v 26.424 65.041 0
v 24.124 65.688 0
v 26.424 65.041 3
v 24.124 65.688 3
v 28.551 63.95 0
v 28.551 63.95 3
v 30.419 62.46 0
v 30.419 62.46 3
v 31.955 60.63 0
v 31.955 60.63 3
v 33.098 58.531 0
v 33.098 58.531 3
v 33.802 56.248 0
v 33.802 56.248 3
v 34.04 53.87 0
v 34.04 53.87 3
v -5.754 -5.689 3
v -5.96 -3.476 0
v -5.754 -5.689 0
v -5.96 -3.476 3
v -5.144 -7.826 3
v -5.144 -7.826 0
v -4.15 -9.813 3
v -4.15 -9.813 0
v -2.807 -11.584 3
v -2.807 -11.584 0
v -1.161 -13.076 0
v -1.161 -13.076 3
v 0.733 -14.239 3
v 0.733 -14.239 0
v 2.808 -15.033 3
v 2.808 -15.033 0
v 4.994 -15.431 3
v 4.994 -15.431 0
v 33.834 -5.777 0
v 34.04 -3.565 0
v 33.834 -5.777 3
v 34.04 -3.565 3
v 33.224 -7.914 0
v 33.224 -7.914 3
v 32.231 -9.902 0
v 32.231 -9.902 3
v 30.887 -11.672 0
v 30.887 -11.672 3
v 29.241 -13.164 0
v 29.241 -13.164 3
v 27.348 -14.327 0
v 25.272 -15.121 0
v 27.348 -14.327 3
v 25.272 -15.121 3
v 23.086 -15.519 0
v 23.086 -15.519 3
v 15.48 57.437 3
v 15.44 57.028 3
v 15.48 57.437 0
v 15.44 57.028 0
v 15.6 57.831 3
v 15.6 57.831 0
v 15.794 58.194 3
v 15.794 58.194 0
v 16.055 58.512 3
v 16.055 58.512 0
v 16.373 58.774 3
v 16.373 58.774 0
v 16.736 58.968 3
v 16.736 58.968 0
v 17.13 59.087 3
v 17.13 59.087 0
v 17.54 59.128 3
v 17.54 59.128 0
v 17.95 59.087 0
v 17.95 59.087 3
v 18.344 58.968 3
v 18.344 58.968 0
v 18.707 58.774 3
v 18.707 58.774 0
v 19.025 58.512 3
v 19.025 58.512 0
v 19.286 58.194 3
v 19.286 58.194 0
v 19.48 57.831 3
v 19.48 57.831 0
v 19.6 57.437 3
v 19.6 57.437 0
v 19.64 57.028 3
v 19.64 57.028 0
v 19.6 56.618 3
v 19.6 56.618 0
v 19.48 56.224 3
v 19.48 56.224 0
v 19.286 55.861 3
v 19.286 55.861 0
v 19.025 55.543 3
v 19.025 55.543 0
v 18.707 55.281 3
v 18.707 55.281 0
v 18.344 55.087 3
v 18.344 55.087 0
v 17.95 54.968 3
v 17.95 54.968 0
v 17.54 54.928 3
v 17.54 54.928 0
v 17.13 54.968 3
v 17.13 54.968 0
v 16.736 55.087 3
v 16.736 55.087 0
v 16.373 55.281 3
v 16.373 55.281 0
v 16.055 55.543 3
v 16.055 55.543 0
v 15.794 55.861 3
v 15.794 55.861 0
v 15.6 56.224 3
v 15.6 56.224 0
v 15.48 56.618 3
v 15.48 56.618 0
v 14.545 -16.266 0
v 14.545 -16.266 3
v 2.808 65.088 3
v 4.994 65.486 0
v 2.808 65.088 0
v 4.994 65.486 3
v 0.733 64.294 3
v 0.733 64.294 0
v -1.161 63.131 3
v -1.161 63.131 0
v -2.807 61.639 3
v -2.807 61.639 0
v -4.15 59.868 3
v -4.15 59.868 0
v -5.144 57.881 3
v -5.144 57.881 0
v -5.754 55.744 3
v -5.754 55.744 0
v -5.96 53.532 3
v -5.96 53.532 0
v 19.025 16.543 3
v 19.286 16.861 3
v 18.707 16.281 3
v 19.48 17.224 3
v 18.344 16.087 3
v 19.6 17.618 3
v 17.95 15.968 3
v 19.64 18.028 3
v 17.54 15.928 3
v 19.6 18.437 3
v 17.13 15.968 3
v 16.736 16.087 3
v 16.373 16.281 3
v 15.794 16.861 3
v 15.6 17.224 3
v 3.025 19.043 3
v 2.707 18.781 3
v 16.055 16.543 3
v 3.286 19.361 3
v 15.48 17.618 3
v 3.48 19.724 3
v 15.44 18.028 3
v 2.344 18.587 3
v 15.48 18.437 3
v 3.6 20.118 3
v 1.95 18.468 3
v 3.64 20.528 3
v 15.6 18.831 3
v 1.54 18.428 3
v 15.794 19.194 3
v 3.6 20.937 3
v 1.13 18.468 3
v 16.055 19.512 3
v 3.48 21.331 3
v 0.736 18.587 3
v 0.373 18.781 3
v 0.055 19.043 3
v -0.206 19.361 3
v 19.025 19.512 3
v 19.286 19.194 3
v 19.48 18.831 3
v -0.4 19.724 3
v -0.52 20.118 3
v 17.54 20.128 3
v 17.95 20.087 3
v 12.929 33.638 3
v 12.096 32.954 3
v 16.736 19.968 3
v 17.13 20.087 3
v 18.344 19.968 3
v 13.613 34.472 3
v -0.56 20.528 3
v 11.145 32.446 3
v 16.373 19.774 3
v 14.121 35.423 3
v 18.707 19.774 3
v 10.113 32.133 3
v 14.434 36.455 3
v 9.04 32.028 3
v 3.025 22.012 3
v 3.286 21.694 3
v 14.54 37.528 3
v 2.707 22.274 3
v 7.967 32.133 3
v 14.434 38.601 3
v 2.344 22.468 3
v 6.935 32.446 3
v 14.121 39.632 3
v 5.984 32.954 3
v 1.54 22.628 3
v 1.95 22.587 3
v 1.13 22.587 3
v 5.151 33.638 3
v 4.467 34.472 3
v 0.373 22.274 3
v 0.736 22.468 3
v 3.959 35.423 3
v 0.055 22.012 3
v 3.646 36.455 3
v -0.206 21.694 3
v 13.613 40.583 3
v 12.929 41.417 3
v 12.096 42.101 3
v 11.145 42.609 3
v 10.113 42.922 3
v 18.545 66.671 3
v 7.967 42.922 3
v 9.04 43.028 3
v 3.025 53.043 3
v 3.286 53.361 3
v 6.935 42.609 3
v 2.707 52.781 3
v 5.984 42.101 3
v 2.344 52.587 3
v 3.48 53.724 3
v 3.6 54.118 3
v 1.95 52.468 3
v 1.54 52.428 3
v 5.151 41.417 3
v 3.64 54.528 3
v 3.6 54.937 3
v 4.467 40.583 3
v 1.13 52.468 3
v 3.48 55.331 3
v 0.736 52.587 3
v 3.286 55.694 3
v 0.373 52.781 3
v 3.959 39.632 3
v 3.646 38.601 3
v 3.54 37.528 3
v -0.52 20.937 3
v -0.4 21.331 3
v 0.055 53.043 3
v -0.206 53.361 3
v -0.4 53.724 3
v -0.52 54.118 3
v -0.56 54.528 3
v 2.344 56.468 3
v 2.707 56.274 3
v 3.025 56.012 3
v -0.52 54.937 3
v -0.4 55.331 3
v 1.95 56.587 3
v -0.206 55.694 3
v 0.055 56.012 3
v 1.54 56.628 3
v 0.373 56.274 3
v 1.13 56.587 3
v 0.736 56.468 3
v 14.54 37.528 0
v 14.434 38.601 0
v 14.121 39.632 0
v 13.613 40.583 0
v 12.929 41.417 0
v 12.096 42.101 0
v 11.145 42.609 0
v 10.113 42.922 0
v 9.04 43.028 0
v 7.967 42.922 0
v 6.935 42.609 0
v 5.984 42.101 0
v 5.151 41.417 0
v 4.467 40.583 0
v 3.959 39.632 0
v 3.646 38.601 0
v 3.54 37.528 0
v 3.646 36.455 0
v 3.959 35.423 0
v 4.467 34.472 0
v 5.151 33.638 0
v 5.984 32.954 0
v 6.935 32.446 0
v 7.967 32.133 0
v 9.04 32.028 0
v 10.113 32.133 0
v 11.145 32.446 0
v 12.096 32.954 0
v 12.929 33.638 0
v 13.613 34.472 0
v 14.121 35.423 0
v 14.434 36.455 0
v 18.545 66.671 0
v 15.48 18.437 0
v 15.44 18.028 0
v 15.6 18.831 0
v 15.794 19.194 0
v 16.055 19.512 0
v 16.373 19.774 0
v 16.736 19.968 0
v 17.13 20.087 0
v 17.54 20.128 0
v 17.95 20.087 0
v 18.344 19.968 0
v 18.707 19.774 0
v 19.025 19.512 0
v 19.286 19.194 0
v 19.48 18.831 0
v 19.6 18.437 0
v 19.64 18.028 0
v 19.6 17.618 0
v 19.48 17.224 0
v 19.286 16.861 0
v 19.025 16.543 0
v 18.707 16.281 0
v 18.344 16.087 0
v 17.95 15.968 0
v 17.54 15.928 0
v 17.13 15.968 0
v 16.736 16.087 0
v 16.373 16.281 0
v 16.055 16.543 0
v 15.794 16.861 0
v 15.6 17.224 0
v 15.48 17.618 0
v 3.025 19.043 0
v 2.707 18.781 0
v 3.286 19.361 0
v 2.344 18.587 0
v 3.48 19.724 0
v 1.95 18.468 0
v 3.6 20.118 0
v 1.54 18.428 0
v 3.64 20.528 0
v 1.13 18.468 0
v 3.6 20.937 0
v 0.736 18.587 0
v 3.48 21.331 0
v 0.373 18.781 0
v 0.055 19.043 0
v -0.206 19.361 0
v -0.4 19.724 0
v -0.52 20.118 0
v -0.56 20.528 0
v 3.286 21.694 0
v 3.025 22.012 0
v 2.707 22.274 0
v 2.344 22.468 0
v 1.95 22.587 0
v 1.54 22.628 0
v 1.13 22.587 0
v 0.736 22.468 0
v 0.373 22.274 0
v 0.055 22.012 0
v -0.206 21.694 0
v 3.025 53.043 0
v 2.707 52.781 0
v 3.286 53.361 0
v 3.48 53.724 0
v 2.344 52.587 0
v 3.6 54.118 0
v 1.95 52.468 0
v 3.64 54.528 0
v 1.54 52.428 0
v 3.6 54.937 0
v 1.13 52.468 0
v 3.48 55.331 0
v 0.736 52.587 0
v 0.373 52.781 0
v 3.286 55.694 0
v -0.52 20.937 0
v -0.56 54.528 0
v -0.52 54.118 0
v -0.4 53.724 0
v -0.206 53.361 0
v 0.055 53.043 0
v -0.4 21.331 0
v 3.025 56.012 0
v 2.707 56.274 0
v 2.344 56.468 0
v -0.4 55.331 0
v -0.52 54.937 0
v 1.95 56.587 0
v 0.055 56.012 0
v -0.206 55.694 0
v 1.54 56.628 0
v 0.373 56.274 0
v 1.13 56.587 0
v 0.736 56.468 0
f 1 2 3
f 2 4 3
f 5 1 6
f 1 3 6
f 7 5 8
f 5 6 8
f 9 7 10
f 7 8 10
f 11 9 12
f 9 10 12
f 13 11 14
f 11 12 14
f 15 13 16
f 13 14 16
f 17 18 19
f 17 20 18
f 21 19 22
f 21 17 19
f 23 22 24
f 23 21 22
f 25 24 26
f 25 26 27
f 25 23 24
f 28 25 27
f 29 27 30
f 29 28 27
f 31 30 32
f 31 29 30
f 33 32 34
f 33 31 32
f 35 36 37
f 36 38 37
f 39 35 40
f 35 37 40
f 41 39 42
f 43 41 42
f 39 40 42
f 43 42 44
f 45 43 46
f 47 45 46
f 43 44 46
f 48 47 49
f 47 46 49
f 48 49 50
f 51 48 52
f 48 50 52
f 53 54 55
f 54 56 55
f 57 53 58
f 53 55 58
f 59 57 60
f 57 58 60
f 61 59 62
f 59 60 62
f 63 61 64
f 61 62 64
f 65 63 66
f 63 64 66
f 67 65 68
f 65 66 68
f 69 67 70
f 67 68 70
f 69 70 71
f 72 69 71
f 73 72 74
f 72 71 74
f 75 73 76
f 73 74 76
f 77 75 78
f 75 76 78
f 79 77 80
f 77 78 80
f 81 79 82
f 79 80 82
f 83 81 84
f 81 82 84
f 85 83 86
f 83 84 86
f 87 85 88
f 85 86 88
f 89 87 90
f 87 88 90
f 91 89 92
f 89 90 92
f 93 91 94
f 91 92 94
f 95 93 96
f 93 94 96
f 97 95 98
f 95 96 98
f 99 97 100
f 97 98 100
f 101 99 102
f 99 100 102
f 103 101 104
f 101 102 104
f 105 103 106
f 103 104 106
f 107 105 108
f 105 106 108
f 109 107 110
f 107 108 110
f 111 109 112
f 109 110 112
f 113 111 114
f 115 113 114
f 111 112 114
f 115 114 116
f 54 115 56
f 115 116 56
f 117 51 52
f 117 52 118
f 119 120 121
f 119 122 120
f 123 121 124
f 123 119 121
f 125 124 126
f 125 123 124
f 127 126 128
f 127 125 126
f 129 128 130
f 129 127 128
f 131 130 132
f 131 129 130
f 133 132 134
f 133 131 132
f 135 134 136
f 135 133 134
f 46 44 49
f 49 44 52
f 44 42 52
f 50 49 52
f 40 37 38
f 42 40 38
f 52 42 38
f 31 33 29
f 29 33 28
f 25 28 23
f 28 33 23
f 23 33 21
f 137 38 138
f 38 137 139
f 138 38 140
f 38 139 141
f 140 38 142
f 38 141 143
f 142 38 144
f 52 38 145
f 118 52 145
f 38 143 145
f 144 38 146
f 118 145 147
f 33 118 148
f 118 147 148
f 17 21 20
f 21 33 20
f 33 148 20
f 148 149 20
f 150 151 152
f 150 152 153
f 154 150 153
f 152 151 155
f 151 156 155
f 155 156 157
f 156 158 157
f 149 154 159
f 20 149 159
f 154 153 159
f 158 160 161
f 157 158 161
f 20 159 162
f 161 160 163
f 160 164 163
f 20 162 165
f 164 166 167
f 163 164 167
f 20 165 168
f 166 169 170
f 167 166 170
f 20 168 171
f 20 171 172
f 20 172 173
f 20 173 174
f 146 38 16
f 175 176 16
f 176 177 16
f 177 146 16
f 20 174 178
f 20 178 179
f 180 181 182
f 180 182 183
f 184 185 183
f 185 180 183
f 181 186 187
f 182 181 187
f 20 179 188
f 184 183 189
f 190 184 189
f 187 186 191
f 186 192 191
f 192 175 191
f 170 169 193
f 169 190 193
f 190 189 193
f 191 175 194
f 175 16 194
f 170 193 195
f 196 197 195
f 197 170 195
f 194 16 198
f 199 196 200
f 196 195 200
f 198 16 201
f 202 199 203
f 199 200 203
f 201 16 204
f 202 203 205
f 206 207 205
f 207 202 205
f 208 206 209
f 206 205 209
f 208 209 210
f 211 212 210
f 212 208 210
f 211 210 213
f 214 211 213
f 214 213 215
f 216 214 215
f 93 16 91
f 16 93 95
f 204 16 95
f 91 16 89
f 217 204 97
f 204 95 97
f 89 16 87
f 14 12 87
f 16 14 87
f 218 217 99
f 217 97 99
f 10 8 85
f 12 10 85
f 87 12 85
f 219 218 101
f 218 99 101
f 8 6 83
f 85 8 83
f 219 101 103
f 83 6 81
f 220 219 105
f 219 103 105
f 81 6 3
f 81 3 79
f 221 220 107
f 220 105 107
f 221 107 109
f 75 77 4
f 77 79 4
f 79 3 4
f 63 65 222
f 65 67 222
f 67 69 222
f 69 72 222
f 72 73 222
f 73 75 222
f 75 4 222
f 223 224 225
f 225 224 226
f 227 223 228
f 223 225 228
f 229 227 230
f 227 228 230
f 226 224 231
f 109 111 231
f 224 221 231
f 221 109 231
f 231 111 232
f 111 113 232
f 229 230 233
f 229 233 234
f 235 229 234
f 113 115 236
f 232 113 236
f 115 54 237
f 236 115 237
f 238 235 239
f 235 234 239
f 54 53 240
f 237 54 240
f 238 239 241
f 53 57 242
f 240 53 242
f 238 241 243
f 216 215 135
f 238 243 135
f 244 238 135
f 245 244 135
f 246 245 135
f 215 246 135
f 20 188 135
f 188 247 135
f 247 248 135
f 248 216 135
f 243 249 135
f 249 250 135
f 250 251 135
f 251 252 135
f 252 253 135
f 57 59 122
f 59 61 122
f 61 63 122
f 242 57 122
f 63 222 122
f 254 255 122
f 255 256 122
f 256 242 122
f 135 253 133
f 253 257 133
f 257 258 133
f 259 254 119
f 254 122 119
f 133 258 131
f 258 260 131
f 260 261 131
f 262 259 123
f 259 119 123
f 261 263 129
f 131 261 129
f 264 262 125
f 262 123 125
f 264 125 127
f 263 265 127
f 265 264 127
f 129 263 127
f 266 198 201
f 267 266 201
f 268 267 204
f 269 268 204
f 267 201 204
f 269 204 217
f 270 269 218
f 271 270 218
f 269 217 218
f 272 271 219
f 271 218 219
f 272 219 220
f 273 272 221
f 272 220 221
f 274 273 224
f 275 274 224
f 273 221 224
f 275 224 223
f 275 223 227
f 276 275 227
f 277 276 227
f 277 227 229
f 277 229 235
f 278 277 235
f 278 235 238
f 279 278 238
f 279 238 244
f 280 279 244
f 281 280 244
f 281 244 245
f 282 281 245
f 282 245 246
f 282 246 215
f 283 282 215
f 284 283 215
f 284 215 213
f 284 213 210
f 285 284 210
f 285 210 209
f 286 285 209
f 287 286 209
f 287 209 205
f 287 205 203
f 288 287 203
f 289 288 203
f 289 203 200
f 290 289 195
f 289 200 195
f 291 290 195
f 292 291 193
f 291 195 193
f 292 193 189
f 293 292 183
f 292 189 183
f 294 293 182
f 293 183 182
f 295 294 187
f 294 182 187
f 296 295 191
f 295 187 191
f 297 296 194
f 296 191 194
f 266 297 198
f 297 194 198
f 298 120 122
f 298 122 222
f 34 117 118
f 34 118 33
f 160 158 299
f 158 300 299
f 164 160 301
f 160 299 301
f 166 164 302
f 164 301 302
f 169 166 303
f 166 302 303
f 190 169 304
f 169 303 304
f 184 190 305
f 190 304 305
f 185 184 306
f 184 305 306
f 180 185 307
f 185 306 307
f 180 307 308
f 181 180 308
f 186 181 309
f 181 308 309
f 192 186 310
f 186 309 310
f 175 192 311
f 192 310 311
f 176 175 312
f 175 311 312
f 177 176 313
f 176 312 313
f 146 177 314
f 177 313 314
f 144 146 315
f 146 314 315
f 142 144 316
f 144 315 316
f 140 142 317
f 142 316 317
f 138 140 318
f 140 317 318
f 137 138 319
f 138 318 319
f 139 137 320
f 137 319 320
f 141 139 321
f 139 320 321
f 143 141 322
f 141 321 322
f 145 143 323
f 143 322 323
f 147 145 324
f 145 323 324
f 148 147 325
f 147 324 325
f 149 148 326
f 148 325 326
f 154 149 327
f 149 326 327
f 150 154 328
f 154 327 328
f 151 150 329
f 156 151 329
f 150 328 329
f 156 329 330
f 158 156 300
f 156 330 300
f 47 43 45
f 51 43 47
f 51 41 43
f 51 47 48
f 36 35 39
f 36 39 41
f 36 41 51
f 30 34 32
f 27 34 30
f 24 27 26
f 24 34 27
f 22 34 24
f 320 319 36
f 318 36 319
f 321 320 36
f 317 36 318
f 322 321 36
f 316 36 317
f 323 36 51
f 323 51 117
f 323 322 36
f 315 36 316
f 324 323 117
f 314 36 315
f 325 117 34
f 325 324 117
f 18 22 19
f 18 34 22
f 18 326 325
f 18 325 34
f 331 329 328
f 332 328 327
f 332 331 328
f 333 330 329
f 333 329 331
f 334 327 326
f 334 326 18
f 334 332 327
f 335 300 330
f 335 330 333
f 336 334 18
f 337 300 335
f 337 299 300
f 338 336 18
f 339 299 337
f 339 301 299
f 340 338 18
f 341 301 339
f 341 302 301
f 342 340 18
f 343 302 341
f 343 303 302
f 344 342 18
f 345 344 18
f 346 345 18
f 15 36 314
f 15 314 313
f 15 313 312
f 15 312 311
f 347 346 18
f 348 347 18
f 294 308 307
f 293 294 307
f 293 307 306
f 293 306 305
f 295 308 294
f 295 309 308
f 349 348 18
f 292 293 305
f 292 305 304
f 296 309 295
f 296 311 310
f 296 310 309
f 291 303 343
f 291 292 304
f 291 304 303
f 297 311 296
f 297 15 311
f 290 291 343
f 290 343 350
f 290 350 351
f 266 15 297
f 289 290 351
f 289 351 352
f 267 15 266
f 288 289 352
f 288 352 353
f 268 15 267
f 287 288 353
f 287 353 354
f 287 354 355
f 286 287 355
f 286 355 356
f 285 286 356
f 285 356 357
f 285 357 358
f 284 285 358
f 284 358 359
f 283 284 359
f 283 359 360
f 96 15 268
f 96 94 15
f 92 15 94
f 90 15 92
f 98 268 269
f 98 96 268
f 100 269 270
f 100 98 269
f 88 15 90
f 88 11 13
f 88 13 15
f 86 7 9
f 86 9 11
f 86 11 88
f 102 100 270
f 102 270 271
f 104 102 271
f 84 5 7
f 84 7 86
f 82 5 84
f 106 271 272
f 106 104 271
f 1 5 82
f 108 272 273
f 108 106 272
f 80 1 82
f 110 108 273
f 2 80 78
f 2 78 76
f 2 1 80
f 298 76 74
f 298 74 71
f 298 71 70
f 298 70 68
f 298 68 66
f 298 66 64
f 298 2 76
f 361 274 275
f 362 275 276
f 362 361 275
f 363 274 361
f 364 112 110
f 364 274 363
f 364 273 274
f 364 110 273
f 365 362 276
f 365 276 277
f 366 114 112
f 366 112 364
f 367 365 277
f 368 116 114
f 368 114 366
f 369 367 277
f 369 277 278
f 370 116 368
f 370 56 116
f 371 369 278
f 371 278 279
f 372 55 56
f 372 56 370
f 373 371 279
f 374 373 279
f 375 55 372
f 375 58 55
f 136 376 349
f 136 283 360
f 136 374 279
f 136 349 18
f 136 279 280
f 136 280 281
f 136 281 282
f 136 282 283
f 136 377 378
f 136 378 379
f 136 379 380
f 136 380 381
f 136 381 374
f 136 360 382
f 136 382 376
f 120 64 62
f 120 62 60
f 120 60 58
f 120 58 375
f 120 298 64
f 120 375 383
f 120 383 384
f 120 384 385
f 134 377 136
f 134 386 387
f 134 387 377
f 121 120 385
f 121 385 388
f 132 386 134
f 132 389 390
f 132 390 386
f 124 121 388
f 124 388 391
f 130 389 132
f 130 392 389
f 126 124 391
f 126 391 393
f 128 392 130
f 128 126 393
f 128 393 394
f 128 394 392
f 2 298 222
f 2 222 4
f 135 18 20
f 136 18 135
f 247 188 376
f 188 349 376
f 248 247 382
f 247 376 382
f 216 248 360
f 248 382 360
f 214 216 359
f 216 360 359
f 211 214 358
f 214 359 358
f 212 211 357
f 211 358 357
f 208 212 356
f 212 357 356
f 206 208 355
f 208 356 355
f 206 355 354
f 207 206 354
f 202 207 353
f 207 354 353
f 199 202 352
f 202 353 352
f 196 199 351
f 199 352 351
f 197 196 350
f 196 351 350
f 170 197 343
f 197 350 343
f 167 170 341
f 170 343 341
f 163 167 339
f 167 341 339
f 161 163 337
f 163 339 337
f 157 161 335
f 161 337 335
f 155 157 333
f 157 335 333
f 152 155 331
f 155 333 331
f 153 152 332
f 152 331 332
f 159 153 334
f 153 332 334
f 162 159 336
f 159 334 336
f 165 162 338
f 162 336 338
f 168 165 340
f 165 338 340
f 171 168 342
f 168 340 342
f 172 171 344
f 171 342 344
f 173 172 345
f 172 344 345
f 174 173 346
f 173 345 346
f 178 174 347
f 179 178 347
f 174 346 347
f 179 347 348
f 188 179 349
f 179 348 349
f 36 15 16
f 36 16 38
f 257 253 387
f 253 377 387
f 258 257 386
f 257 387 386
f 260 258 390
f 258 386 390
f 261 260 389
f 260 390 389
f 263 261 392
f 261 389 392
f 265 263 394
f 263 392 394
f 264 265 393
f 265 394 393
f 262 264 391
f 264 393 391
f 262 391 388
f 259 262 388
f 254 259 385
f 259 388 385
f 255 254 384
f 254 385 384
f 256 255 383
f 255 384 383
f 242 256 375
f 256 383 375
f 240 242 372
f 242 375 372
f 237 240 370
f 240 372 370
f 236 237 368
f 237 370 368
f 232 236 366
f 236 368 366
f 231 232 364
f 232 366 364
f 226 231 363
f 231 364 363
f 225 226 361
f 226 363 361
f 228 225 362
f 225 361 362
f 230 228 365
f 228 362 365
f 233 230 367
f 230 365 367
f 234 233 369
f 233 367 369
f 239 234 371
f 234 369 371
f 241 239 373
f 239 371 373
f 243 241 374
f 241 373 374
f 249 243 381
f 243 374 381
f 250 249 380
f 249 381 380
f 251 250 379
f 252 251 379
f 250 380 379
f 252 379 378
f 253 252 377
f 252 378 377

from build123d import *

# Parameters (mm, degrees)
EXTRUSION1_DEPTH          = 3
ESQUISSE3_R               = 5.5
ENL_V_MAT_EXTRU_1_DEPTH   = 4
CONG_1_R                  = 12
TROU_TARAUD_M5X0_82_D     = 4.2
TROU_TARAUD_M5X0_82_DEPTH = 3
TROU_TARAUD_M5X0_82_TIP   = 1.2618073


with BuildPart() as part:
    # Esquisse2 → Extrusion1 (new body)
    with BuildSketch(Plane.XY):
        Polygon((-5.959878762, 64.527559487), (18.544923687, 66.671451903), (34.040121238, 63.939230504), (34.040121238, -14.560769496), (14.544923687, -16.266378275), (-5.959878762, -14.472440513), align=None)
    extrude(amount=EXTRUSION1_DEPTH)

    # Esquisse3 → Enlèv. mat.-Extru.1 (cut, through all)
    with BuildSketch(Plane.XY.offset(3)):
        with Locations((9.040121238, 37.527559487)):
            Circle(ESQUISSE3_R)
    extrude(amount=-ENL_V_MAT_EXTRU_1_DEPTH, mode=Mode.SUBTRACT)

    # Congé1
    cong_1_edges = [part.edges().sort_by_distance(p)[0] for p in [
        (-5.959878762, 64.527559487, 1.5),
        (-5.959878762, -14.472440513, 1.5),
        (34.040121238, 63.939230504, 1.5),
        (34.040121238, -14.560769496, 1.5),
    ]]
    fillet(cong_1_edges, radius=CONG_1_R)

    # Trou taraudé M5x0.82
    with Locations(Plane(origin=(1.540121238, 54.527559487, 3), x_dir=(1, 0, 0), z_dir=(0, 0, 1))):
        with Locations((0, 0), (16, 2.5), (0, -34), (16, -36.5)):
            Hole(TROU_TARAUD_M5X0_82_D / 2, depth=TROU_TARAUD_M5X0_82_DEPTH)
            with Locations((0, 0, -(TROU_TARAUD_M5X0_82_DEPTH + TROU_TARAUD_M5X0_82_TIP / 2))):  # 118° drill point
                Cone(0, TROU_TARAUD_M5X0_82_D / 2, TROU_TARAUD_M5X0_82_TIP, mode=Mode.SUBTRACT)


solid = part.part
